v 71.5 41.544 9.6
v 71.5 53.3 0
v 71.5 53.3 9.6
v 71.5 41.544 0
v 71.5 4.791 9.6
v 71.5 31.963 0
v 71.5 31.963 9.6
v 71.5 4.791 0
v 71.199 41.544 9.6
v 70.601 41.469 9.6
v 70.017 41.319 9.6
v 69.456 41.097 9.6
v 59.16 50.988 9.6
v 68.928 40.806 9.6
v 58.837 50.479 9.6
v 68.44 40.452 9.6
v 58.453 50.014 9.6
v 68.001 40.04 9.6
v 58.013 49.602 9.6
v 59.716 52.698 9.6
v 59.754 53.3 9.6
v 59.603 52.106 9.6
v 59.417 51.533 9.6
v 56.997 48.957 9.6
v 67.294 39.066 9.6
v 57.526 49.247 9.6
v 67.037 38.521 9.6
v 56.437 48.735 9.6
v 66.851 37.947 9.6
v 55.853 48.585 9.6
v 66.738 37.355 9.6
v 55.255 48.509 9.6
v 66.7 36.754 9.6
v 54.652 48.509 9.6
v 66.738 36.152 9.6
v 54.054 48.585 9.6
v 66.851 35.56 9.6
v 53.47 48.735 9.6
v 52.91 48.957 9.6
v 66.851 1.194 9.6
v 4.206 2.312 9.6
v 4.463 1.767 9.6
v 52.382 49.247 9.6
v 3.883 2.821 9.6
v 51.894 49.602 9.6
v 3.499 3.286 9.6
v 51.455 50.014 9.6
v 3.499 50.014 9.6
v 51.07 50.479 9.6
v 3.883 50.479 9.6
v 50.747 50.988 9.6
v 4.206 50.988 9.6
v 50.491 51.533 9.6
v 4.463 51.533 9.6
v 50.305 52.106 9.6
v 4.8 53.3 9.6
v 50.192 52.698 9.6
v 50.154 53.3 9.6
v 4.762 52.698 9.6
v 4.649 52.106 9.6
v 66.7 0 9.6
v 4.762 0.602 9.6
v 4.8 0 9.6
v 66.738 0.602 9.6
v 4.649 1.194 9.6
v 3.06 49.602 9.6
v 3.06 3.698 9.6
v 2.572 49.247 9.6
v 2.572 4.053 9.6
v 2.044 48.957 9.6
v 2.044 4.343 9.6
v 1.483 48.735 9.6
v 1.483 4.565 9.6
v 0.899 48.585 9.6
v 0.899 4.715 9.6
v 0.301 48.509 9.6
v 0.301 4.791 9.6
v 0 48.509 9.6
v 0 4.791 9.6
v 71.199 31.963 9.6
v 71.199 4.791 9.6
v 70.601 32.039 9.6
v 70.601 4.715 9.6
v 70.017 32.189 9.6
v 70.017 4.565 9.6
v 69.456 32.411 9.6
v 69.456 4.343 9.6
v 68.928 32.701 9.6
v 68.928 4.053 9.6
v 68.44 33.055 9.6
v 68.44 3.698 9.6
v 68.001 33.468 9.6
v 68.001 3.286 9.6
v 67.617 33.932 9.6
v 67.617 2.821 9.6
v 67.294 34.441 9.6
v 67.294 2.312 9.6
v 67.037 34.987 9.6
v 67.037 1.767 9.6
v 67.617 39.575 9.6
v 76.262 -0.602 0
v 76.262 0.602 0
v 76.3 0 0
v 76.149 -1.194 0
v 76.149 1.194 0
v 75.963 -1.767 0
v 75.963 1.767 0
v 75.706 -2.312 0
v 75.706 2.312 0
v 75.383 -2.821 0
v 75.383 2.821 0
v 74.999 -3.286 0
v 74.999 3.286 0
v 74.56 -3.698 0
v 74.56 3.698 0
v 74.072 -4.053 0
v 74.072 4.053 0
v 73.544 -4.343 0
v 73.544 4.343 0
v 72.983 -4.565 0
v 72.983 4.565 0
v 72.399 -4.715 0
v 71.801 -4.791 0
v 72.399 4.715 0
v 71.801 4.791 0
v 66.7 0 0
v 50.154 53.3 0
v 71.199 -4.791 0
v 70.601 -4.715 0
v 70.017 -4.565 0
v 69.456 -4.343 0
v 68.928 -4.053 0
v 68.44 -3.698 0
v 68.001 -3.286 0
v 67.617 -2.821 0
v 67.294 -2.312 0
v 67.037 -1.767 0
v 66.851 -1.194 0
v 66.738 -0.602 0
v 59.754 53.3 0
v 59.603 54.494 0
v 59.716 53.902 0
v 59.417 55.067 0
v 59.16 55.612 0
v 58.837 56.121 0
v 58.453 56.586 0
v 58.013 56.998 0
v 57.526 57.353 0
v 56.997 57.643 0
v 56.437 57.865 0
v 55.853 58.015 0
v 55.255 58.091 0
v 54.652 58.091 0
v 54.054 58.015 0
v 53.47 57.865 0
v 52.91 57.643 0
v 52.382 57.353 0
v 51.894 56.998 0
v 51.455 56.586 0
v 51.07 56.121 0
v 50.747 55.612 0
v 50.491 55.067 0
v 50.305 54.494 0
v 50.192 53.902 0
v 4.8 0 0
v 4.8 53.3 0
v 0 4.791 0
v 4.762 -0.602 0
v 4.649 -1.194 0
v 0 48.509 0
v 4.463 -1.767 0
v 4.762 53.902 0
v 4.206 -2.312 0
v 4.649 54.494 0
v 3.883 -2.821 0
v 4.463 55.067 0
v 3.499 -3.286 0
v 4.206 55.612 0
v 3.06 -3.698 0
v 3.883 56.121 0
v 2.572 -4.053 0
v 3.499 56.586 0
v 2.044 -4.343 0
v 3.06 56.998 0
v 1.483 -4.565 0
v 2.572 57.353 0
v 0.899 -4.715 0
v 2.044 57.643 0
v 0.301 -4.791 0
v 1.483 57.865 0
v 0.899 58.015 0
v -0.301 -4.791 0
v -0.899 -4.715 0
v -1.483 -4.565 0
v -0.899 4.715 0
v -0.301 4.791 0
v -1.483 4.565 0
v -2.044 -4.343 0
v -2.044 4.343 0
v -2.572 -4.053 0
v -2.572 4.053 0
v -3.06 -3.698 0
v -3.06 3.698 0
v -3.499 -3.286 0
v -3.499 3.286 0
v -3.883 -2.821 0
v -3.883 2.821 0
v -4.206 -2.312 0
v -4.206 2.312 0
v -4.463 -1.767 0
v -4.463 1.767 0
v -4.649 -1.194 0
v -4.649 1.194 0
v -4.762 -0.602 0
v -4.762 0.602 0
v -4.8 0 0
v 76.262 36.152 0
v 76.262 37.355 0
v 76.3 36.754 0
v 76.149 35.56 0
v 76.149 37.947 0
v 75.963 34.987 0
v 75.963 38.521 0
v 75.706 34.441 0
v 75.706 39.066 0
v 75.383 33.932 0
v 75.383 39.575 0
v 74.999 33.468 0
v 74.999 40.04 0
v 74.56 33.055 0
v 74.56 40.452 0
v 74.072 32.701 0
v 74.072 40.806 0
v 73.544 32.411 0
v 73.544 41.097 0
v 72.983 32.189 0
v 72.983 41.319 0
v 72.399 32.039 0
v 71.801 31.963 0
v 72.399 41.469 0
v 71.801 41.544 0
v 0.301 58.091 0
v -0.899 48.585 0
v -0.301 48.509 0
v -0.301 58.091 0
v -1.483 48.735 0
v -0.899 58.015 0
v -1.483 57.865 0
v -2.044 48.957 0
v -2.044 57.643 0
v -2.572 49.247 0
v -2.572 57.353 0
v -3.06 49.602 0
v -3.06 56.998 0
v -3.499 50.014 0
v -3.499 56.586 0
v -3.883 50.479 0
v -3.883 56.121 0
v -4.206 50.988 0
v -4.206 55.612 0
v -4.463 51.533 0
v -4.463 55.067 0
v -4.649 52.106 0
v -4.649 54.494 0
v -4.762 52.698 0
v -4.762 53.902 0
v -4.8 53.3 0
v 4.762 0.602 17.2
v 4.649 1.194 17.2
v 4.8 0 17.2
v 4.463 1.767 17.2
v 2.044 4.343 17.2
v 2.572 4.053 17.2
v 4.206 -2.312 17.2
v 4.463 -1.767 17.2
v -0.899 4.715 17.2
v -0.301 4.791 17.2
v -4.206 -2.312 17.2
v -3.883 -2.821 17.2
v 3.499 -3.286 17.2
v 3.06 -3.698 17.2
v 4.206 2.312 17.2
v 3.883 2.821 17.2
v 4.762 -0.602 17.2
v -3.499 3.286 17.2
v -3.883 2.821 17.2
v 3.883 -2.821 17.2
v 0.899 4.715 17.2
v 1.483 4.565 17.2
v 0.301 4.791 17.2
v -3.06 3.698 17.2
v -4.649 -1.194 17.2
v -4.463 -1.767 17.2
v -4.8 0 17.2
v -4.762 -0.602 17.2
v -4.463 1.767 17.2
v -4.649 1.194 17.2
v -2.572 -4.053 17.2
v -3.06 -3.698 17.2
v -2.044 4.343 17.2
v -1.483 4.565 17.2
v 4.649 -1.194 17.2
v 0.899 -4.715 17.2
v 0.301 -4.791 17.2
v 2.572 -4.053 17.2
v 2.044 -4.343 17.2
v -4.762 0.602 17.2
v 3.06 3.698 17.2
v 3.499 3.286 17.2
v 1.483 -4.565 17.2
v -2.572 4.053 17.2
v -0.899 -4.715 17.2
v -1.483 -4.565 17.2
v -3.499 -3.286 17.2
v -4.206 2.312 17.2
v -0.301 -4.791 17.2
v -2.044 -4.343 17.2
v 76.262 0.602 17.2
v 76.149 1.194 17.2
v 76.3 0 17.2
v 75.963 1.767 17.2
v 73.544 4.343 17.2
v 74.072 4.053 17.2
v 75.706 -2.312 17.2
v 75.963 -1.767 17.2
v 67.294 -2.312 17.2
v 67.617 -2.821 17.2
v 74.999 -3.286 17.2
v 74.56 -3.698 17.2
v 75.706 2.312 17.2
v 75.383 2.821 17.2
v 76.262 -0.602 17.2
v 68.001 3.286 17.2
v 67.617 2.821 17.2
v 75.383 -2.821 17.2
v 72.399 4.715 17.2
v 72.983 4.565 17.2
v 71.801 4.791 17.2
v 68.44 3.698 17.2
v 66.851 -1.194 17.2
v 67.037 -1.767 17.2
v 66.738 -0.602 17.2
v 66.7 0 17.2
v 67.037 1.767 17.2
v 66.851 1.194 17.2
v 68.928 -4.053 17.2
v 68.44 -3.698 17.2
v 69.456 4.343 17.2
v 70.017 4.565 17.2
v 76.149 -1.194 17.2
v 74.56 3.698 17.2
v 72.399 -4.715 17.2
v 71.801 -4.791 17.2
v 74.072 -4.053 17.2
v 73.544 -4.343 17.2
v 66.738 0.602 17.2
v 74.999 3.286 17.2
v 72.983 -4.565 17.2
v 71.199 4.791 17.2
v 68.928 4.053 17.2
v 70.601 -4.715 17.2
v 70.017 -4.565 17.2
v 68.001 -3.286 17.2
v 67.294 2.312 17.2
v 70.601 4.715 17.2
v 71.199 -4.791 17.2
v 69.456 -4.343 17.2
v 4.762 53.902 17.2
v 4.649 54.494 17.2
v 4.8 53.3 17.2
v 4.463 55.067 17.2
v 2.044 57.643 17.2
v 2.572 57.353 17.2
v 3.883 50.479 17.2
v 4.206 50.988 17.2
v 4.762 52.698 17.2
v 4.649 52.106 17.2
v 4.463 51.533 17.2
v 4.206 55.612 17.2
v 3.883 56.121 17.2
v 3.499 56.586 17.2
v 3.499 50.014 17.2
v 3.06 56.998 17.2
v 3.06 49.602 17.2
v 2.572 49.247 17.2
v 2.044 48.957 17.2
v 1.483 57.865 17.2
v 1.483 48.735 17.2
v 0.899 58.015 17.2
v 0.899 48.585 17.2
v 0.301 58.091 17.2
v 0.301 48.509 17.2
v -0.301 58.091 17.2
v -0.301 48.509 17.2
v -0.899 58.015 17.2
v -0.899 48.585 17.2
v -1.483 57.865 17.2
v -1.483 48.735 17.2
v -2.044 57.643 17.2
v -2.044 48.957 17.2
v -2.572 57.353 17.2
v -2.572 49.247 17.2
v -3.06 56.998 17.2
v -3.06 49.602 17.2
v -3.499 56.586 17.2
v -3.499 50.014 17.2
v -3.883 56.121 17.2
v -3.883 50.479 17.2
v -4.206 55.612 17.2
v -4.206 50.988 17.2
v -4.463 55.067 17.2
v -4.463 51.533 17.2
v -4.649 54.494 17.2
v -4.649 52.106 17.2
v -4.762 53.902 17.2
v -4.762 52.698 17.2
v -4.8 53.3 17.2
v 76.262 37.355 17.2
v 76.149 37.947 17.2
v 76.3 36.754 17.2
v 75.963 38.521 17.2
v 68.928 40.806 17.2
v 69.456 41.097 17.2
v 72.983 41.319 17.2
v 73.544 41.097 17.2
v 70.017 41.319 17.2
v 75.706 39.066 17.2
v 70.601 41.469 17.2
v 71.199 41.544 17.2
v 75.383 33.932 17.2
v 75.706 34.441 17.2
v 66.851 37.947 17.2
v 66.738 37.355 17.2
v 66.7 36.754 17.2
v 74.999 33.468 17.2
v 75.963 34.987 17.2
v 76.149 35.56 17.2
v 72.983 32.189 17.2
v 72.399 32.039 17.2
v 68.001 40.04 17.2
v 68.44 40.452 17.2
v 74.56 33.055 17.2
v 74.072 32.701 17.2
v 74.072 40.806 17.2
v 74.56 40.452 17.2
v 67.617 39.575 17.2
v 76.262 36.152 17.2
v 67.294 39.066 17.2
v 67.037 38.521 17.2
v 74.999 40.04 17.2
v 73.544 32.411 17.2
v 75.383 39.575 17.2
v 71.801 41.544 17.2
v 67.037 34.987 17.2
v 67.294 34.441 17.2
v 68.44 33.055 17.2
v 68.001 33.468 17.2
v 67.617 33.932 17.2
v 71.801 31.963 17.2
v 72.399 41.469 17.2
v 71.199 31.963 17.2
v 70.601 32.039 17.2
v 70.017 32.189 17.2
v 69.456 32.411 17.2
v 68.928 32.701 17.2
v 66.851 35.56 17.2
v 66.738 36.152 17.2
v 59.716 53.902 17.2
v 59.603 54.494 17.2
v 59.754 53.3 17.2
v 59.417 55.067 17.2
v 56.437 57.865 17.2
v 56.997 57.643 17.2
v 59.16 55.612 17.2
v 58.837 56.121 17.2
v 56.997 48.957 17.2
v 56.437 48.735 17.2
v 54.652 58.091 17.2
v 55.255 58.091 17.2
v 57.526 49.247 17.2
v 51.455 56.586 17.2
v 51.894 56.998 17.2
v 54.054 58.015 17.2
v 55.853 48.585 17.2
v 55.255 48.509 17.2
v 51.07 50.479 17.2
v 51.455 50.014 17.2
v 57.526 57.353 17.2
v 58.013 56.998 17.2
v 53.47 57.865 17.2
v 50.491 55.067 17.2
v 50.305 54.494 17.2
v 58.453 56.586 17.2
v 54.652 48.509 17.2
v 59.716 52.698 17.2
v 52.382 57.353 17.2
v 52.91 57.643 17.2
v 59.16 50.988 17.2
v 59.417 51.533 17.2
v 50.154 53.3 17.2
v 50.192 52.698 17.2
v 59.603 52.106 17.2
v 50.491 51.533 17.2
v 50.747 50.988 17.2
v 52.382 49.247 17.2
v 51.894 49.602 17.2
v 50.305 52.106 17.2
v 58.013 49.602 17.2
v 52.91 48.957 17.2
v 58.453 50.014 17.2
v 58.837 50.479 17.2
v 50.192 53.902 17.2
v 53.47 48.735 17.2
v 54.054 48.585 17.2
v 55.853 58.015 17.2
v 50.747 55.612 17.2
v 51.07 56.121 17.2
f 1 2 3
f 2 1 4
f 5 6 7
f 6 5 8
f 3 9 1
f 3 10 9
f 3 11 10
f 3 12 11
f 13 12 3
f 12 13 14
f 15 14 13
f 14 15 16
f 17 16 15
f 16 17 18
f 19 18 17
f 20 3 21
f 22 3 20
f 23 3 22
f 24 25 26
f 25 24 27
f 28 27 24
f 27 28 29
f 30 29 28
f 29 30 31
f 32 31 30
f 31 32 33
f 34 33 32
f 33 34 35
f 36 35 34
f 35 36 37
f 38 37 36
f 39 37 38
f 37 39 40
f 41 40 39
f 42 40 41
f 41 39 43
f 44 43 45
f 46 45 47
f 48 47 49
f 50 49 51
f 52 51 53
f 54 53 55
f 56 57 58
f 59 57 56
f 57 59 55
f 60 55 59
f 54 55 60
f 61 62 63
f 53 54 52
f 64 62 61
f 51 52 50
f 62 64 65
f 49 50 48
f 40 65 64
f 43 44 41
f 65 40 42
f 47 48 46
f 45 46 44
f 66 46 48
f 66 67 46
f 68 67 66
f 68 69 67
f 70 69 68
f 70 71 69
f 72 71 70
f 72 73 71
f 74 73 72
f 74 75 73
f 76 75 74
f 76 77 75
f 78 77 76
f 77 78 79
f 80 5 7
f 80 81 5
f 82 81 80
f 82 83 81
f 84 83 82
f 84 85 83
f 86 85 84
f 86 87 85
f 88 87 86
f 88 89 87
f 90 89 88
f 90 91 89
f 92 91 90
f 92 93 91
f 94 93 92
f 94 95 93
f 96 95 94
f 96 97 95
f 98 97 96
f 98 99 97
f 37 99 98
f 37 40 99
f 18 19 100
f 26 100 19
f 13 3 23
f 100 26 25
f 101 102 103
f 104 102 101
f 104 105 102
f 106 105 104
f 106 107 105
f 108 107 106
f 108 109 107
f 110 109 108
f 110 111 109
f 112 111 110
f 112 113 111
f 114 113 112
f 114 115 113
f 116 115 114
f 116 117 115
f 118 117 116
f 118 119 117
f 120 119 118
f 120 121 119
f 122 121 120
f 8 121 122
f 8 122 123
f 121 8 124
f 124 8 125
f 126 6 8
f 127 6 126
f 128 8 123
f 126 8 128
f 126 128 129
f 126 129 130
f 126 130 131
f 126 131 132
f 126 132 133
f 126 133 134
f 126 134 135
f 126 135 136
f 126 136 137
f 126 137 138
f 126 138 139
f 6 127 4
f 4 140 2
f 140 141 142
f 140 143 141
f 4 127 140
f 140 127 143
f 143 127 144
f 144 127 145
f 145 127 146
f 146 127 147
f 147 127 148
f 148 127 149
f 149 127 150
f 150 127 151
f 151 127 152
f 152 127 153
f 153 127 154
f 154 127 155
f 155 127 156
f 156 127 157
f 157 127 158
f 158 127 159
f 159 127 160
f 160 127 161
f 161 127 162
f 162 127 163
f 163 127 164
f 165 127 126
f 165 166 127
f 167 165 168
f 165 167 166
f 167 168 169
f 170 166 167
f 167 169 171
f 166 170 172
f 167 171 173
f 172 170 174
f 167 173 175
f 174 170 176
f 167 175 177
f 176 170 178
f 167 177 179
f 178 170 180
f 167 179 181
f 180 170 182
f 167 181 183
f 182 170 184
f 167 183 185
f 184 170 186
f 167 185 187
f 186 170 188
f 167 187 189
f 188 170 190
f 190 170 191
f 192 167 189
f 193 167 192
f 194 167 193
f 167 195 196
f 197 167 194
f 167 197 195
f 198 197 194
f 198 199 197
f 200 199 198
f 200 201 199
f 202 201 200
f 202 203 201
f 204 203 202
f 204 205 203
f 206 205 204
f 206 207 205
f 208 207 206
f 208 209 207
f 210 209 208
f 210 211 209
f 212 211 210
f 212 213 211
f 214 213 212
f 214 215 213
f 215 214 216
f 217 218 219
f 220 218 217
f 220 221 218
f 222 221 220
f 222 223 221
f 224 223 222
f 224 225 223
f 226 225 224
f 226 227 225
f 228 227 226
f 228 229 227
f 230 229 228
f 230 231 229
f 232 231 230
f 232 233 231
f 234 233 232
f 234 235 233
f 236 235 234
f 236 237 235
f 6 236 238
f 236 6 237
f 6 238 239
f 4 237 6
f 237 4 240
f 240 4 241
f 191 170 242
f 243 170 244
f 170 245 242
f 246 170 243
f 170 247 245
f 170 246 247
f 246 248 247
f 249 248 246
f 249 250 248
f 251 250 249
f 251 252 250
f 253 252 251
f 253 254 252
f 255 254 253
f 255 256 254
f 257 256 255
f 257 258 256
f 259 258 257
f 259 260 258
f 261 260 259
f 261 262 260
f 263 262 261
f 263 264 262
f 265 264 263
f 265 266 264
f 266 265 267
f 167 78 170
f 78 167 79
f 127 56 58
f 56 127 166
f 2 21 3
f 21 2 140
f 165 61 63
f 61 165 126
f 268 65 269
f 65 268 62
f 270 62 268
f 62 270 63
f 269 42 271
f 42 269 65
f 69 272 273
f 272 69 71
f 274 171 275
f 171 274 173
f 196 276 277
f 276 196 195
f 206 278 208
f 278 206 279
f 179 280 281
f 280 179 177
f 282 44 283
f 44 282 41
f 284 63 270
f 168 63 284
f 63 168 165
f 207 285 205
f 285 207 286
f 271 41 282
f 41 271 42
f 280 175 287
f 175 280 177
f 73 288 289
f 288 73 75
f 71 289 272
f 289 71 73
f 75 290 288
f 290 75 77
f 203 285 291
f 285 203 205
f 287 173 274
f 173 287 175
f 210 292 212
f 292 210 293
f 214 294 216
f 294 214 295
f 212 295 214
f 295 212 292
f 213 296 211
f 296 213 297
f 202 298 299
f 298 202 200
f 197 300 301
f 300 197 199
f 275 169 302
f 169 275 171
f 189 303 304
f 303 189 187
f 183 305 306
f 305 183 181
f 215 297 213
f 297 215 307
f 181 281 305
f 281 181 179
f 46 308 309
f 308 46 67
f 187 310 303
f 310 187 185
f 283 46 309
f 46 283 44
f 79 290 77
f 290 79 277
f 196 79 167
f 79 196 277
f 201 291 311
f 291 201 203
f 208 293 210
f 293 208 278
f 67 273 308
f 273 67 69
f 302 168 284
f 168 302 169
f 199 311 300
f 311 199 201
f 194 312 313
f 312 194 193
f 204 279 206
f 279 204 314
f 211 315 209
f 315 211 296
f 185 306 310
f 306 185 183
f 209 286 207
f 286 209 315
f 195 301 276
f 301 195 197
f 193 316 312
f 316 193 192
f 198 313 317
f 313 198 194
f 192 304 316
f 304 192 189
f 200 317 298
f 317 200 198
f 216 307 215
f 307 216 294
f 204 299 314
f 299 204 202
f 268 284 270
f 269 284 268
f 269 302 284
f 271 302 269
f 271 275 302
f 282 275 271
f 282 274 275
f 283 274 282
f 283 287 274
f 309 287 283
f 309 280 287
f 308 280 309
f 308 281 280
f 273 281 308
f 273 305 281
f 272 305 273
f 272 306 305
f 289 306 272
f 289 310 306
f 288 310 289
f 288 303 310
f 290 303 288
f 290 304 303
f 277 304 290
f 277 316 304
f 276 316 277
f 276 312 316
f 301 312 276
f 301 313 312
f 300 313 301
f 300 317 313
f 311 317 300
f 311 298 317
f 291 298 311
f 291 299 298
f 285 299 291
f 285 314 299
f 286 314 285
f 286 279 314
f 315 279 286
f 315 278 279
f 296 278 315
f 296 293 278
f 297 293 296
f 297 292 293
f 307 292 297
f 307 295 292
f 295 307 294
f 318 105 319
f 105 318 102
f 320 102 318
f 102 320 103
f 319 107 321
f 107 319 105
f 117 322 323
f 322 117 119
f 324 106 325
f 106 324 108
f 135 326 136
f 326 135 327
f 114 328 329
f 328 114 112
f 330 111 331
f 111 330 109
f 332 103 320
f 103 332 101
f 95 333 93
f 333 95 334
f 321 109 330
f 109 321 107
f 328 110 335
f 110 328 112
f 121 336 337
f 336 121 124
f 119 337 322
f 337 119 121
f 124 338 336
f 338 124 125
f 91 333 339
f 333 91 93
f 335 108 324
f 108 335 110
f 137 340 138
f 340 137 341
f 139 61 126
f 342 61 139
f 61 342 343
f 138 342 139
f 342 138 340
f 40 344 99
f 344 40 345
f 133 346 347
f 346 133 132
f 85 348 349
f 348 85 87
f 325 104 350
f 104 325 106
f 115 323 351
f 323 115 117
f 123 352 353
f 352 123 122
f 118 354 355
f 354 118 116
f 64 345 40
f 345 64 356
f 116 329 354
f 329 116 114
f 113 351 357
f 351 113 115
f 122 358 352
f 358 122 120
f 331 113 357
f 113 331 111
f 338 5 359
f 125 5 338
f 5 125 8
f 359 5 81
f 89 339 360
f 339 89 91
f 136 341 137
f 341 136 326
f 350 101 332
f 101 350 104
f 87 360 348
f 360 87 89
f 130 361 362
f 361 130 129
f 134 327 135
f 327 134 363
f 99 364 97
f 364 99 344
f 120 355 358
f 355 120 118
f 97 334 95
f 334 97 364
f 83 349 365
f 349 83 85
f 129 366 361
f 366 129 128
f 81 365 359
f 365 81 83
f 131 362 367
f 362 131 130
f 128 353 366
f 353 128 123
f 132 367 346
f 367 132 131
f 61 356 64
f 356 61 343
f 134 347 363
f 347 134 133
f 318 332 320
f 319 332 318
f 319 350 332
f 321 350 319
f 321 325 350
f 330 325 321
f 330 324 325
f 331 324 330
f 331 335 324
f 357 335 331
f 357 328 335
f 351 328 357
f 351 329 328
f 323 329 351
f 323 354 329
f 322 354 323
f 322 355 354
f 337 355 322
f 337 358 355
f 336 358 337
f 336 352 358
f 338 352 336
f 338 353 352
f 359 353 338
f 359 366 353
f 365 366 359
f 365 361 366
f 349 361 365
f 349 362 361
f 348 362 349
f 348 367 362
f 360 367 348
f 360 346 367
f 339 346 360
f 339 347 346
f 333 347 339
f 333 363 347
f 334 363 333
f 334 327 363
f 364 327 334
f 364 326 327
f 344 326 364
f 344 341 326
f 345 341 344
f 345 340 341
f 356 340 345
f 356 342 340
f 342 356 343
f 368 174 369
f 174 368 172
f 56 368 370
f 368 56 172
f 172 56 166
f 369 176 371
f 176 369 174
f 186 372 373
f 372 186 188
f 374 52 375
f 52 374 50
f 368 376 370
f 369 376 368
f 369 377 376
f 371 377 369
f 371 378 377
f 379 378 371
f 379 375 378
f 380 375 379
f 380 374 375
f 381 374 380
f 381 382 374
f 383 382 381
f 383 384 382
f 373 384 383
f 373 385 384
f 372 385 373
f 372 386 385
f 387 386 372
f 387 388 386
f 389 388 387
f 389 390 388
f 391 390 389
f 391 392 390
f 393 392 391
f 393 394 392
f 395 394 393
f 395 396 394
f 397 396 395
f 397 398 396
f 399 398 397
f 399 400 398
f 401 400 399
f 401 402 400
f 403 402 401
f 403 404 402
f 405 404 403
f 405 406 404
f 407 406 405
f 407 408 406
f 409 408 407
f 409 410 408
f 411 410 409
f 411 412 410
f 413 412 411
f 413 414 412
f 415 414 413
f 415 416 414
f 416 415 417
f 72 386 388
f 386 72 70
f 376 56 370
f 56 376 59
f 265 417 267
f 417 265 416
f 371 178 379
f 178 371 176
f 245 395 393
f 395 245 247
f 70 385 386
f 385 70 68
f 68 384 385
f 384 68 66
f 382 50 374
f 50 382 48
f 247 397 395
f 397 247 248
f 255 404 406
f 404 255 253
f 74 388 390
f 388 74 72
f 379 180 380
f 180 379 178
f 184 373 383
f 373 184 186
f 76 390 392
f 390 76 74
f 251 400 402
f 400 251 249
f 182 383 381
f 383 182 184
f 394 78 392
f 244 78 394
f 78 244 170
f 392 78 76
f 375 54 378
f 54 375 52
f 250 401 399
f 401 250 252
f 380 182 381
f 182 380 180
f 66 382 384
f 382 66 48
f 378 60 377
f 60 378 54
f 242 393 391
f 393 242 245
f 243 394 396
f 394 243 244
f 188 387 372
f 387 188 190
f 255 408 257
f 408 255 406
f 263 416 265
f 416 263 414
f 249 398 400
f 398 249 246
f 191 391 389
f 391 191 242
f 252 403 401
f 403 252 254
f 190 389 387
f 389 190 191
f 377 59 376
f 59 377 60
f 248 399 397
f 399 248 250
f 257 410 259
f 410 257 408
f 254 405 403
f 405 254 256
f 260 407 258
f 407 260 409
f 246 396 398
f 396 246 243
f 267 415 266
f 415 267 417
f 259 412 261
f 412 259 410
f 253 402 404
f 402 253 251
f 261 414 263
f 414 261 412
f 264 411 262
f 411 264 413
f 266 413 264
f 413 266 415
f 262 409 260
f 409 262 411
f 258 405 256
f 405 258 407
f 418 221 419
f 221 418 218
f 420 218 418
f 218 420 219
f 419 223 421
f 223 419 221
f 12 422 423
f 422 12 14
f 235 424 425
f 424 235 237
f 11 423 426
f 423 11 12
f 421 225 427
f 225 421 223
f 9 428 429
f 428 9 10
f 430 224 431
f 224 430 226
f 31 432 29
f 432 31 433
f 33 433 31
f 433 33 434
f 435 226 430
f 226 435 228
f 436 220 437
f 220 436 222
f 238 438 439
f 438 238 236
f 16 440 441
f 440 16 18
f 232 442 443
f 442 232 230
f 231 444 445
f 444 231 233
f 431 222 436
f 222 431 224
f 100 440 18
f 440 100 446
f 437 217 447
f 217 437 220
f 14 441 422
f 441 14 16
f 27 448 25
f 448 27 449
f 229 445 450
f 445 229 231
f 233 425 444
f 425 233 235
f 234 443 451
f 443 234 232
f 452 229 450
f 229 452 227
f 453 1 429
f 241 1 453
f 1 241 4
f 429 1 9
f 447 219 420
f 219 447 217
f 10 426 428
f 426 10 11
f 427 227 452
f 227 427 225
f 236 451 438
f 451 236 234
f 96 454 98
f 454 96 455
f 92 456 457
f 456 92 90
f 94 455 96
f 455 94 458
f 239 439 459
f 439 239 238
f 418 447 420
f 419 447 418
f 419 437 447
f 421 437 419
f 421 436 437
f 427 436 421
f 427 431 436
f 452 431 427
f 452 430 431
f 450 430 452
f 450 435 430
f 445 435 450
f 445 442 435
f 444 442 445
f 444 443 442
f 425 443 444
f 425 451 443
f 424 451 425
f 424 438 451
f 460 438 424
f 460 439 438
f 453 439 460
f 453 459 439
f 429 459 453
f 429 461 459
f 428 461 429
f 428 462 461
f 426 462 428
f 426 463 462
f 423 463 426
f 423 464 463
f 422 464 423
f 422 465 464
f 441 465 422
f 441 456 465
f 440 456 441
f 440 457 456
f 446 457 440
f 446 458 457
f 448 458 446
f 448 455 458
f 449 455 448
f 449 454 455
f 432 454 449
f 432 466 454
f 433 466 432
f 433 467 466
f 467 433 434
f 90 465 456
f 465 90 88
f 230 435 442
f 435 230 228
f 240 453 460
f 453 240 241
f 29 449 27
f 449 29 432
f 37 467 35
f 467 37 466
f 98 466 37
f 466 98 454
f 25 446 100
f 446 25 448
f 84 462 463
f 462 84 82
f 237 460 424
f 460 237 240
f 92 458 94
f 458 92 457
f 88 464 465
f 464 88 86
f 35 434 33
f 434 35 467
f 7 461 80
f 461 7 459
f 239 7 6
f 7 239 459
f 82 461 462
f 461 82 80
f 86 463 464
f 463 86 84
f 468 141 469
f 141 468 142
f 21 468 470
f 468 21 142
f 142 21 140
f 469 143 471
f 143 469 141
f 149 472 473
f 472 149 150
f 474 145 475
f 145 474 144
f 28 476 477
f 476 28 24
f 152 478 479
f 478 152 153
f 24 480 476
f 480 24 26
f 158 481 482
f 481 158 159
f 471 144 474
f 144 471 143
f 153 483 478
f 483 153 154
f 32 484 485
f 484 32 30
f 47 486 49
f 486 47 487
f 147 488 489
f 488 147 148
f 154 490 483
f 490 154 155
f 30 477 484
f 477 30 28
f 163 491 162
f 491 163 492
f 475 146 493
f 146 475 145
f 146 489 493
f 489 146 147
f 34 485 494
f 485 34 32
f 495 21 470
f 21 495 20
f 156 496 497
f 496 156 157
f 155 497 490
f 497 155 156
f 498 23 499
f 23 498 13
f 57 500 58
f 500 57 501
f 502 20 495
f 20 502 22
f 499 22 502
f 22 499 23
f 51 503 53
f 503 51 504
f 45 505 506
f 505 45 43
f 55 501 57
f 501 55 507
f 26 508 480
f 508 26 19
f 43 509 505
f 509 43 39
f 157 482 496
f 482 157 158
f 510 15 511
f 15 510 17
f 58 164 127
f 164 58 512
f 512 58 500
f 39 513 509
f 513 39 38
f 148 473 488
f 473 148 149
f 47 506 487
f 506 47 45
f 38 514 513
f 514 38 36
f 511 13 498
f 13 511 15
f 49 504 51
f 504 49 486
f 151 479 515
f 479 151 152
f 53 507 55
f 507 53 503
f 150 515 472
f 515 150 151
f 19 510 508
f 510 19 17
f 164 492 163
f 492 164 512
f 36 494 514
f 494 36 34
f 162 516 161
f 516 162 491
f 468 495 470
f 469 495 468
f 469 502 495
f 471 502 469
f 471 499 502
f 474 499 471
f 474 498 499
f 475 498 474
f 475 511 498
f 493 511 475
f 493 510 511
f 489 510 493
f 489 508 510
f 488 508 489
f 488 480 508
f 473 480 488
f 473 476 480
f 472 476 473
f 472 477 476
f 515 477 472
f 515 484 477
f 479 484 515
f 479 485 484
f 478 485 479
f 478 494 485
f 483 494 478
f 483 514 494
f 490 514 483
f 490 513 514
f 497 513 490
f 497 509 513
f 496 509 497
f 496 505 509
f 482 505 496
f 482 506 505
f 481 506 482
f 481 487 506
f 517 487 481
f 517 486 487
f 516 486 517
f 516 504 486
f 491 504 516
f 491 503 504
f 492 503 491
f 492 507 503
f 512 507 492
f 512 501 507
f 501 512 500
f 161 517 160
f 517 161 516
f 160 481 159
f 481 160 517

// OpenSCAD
$fn = 50;

s = 1.3;

x = 55*s;
y = 41*s; 
z = 9.6;

ultra = 18*s;

cylHeight = 17.2;
cylRad = 9.6/2;

oddCylShift = ultra*sin(45);
echo(oddCylShift);
module cyl(){
	cylinder(r=cylRad, h=cylHeight);
}

module mainPart() {
	union(){
		difference(){
			cube([x,y,z]);
			translate([x,y,ultra/3])
			rotate([0,0,45])
			%cube([ultra,ultra,ultra], center=true);
		}
		
		cyl();
		
		translate([x,0,0])
		cyl();
		
		translate([0,y,0])
		cyl();
	
		translate([x,y-oddCylShift,0])
		cyl();
		
		translate([x-oddCylShift,y,0])
		cyl();
	}
}

mainPart();
